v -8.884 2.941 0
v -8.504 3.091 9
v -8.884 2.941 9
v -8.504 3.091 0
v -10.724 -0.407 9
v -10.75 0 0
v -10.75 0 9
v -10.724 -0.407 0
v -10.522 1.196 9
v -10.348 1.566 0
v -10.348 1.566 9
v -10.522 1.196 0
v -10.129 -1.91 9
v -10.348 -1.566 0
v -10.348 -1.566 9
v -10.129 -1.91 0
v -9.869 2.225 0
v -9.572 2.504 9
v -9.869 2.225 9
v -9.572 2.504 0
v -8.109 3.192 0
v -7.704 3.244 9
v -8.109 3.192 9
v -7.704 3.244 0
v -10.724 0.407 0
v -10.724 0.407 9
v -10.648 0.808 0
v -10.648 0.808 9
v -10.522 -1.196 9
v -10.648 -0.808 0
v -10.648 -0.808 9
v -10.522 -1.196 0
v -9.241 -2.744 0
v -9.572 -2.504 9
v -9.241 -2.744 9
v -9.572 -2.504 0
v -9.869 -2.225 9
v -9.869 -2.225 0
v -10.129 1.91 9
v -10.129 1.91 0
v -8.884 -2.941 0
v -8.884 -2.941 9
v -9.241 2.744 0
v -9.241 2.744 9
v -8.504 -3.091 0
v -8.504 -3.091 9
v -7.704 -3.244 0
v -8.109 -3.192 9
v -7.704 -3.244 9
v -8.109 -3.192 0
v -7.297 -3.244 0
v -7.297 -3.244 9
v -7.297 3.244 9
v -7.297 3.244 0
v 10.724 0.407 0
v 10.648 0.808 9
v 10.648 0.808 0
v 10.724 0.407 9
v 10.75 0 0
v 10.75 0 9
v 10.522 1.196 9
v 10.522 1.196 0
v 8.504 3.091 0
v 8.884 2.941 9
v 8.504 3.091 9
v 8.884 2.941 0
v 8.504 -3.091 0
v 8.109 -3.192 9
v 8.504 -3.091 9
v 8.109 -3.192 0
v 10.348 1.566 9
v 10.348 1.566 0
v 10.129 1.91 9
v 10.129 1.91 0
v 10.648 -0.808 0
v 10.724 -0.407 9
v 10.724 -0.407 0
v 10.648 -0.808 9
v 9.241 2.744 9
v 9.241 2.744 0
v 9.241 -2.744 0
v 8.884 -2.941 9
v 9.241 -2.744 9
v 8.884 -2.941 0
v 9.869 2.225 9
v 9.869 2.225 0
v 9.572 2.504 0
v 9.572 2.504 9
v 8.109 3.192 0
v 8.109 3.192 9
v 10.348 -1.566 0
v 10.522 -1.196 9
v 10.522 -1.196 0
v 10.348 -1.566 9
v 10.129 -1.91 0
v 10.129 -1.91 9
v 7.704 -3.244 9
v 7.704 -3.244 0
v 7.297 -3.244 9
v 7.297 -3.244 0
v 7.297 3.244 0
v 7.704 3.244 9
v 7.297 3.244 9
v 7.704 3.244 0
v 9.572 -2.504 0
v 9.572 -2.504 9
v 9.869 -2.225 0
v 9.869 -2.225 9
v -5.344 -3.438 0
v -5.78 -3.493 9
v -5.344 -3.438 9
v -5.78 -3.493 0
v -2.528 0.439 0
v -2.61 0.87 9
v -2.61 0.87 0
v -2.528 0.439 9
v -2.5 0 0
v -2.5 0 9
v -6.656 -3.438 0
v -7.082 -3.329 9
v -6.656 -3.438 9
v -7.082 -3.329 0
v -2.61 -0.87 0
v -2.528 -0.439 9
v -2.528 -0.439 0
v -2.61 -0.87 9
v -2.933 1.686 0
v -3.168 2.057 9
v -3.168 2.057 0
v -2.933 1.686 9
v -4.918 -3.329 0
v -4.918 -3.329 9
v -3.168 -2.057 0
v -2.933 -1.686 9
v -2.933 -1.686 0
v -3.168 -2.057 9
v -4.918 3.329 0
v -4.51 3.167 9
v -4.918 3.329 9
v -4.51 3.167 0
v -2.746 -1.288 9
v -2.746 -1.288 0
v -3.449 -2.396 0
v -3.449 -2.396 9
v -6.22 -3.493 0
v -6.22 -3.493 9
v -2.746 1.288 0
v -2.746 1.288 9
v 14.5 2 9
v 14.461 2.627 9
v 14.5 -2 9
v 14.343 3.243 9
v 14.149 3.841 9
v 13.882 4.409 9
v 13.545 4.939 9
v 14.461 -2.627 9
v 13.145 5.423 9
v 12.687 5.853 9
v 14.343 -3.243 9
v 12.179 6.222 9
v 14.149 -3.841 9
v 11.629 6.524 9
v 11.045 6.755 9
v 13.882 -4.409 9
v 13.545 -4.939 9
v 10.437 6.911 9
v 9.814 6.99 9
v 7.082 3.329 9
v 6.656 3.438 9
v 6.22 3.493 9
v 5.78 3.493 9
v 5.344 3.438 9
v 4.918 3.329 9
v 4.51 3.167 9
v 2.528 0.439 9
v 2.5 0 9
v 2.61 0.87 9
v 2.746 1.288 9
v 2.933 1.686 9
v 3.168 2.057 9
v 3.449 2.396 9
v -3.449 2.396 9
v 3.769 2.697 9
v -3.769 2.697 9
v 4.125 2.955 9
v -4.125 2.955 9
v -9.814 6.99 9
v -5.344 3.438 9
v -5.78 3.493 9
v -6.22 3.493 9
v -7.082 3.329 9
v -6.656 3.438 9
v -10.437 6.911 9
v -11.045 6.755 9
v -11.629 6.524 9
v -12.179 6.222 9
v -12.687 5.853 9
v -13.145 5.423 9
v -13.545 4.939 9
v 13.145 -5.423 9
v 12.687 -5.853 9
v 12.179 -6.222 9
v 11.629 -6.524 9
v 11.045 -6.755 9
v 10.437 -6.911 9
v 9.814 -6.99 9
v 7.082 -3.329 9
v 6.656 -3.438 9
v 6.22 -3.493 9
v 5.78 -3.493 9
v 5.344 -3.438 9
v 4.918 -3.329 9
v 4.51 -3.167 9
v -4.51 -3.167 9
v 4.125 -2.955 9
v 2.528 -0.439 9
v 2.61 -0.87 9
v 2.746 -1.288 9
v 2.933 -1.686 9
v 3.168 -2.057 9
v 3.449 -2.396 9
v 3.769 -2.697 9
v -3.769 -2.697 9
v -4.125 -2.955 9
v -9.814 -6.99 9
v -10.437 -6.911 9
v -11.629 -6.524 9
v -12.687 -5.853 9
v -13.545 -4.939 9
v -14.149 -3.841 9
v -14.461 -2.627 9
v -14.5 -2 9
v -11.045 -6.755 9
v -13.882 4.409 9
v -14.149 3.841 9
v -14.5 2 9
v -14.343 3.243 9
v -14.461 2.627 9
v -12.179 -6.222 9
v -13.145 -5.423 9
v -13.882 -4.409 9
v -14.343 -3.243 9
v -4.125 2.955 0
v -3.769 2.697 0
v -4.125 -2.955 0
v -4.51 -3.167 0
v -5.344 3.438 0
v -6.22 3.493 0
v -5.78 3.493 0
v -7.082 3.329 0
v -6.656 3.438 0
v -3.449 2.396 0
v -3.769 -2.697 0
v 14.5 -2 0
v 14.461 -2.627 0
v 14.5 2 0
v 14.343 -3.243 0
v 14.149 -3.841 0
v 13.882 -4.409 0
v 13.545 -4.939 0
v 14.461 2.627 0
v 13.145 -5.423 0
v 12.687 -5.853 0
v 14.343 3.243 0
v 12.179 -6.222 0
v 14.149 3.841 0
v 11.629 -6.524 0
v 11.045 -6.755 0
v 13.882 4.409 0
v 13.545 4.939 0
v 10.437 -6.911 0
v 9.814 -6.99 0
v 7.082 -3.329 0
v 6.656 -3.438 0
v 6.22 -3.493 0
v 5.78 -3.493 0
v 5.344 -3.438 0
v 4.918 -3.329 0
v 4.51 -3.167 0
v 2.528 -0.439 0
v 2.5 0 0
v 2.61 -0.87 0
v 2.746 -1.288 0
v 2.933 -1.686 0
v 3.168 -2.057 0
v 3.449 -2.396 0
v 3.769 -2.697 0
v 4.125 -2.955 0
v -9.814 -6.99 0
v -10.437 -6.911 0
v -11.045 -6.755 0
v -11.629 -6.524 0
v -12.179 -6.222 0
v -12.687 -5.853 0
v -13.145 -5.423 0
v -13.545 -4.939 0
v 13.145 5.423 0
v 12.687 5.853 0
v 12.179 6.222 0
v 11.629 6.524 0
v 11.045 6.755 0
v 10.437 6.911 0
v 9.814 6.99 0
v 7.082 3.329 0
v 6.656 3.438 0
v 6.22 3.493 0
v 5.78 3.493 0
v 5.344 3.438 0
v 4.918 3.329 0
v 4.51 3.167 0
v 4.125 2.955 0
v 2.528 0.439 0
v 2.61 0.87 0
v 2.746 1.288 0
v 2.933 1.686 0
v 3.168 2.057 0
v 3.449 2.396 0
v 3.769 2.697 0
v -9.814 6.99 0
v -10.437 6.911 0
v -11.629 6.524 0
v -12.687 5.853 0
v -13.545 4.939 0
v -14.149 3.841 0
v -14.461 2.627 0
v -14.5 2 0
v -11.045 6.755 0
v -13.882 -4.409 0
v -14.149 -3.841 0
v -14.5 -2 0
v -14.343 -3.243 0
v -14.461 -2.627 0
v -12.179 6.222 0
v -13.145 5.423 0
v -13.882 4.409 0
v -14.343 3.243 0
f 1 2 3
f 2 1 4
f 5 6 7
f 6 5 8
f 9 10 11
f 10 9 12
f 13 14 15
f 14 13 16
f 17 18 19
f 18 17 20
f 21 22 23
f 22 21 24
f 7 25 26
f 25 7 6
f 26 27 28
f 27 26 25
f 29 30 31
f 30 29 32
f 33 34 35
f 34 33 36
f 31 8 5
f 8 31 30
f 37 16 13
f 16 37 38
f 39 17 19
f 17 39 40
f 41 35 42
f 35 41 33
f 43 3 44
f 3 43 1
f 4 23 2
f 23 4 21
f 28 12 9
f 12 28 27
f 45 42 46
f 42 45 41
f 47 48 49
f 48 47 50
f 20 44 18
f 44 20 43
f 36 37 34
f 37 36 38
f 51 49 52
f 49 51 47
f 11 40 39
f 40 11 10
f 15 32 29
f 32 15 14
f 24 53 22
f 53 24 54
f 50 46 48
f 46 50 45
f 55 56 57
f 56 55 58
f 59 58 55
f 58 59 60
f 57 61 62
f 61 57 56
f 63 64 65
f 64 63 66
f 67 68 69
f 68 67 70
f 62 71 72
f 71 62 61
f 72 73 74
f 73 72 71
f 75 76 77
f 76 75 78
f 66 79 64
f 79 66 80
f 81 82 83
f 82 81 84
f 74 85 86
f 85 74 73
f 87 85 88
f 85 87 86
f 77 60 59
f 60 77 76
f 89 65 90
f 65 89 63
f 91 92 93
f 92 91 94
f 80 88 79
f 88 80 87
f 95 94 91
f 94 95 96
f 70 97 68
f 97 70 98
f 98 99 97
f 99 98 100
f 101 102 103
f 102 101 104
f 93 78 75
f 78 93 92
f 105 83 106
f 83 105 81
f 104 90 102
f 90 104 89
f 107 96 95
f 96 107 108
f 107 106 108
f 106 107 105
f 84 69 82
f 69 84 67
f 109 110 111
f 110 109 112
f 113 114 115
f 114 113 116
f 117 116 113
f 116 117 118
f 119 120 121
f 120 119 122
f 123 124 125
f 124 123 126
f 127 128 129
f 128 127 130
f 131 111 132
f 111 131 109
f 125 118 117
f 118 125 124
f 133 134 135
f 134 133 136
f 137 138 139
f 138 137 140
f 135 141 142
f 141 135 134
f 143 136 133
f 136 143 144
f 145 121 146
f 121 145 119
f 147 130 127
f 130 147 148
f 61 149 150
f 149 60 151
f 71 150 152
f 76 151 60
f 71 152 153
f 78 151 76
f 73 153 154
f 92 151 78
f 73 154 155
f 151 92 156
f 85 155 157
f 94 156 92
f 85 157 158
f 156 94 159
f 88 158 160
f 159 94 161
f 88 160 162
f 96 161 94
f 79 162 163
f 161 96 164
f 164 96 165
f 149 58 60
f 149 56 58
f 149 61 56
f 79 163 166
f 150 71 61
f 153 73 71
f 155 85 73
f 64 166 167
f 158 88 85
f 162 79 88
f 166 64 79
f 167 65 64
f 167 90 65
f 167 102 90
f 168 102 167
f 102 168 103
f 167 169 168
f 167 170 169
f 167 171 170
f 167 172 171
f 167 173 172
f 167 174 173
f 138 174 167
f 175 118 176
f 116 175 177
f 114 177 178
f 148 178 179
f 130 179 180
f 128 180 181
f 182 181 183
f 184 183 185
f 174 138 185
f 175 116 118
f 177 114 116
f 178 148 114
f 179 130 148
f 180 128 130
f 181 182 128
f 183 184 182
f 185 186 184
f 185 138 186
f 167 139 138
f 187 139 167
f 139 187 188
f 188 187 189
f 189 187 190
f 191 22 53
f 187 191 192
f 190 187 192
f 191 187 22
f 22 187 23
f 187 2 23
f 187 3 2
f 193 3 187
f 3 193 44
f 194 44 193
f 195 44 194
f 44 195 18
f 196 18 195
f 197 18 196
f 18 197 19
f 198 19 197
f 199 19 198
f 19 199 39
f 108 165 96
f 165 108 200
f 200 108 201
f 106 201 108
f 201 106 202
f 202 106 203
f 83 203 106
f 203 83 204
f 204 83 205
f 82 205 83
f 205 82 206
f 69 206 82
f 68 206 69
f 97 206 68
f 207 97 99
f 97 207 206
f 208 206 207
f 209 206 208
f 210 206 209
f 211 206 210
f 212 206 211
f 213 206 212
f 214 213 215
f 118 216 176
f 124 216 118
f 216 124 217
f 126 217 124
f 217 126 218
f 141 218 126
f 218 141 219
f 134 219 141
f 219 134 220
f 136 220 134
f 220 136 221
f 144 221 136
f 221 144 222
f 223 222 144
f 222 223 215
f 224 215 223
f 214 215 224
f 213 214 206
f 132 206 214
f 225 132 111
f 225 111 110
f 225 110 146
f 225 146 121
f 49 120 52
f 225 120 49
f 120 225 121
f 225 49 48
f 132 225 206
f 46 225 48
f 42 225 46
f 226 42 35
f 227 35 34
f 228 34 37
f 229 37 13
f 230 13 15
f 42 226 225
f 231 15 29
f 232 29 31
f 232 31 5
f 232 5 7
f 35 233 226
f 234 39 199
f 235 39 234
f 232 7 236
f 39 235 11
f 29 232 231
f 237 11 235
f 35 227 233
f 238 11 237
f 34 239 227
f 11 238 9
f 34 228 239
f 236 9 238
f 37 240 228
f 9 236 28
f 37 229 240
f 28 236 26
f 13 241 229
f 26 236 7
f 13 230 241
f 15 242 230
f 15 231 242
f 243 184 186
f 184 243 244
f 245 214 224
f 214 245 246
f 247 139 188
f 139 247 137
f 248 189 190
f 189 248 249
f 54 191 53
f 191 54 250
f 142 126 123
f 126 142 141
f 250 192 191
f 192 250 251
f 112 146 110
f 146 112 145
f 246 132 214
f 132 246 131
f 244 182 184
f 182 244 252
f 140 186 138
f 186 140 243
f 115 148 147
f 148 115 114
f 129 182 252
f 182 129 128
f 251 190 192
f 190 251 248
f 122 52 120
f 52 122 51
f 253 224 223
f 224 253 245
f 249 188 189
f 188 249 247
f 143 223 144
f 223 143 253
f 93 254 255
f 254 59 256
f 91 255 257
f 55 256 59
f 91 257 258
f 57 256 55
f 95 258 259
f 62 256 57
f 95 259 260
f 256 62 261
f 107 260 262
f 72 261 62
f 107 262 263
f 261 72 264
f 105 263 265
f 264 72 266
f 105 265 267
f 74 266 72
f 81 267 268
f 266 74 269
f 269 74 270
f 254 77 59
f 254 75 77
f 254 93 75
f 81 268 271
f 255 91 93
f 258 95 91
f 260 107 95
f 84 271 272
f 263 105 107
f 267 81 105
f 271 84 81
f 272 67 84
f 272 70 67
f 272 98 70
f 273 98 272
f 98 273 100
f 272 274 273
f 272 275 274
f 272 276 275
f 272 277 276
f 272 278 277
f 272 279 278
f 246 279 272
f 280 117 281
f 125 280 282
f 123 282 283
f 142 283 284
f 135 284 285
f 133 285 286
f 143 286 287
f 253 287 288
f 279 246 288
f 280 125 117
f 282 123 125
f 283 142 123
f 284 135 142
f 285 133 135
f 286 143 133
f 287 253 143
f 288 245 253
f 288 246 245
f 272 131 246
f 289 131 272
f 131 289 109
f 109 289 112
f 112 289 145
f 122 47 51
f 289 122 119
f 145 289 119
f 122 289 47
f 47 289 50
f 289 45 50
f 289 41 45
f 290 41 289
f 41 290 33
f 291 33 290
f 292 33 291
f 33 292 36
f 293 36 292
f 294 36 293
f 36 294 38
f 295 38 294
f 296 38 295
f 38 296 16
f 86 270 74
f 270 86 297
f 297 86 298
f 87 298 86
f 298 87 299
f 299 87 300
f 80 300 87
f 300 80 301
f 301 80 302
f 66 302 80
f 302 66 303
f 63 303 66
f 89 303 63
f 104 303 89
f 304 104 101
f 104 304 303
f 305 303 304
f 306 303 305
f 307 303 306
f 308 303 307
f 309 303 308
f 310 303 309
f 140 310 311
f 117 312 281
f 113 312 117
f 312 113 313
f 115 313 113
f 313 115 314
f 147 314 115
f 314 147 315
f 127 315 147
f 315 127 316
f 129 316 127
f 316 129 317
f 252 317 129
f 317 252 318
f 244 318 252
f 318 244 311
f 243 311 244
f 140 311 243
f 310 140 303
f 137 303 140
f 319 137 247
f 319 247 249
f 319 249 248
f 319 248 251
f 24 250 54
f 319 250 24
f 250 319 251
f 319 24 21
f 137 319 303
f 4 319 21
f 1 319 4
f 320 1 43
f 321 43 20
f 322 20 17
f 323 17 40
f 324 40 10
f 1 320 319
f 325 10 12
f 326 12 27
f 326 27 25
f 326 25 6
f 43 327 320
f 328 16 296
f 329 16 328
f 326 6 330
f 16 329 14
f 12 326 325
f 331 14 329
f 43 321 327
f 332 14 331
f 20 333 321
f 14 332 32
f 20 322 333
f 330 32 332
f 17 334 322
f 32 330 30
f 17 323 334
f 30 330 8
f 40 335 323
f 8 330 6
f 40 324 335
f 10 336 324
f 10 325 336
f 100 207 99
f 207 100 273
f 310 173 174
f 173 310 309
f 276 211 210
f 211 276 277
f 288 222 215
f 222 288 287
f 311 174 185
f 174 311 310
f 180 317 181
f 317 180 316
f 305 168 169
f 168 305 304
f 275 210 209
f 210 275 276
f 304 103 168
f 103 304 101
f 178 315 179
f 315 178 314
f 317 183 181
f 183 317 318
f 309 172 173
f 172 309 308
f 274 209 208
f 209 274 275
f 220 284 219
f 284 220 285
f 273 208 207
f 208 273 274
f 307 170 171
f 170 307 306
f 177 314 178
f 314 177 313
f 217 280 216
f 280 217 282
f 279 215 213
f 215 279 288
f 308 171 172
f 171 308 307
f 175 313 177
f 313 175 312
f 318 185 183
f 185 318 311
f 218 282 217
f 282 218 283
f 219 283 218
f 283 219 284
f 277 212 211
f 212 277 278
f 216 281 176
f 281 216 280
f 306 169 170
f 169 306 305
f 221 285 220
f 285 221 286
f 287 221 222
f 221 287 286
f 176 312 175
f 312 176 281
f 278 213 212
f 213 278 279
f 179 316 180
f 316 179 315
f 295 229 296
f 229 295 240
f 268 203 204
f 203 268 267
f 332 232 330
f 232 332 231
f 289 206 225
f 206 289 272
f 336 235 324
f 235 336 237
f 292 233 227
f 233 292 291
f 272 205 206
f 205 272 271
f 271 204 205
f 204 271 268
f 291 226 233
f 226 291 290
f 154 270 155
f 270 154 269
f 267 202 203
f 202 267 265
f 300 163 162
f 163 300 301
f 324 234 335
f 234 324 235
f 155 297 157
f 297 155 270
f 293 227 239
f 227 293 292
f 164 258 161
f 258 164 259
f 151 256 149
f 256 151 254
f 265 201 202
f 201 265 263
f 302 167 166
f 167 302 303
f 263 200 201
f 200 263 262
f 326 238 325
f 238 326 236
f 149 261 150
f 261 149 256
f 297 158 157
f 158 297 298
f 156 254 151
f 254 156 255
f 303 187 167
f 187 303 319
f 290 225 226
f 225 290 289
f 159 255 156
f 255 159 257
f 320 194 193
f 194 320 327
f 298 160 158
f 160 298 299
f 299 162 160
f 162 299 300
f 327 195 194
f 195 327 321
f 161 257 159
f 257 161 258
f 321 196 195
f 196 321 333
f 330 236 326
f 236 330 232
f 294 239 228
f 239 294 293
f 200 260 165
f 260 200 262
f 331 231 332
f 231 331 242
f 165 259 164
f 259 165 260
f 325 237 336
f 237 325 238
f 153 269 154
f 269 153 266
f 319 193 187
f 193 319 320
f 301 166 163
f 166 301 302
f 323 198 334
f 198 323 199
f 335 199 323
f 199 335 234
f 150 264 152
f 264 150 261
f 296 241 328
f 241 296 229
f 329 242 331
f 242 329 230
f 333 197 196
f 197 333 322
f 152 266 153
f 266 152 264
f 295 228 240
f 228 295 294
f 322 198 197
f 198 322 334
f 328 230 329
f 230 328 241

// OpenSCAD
$fn = 50;

difference() {
	union() {
		hull() {
			translate(v = [-9.5, 2.0, 0]) {
				cylinder(h = 9, r = 5);
			}
			translate(v = [9.5, 2.0, 0]) {
				cylinder(h = 9, r = 5);
			}
			translate(v = [-9.5, -2.0, 0]) {
				cylinder(h = 9, r = 5);
			}
			translate(v = [9.5, -2.0, 0]) {
				cylinder(h = 9, r = 5);
			}
		}
	}
	union() {
		translate(v = [-7.5, 0.0, -100.0]) {
			cylinder(h = 200, r = 3.25);
		}
		translate(v = [7.5, 0.0, -100.0]) {
			cylinder(h = 200, r = 3.25);
		}
		translate(v = [-7.5, 0.0, -100.0]) {
			cylinder(h = 200, r = 1.8);
		}
		translate(v = [7.5, 0.0, -100.0]) {
			cylinder(h = 200, r = 1.8);
		}
		translate(v = [-6.0, 0, 0.0]) {
			cylinder(h = 9, r = 3.5);
		}
		translate(v = [6.0, 0, 0.0]) {
			cylinder(h = 9, r = 3.5);
		}
	}
}
